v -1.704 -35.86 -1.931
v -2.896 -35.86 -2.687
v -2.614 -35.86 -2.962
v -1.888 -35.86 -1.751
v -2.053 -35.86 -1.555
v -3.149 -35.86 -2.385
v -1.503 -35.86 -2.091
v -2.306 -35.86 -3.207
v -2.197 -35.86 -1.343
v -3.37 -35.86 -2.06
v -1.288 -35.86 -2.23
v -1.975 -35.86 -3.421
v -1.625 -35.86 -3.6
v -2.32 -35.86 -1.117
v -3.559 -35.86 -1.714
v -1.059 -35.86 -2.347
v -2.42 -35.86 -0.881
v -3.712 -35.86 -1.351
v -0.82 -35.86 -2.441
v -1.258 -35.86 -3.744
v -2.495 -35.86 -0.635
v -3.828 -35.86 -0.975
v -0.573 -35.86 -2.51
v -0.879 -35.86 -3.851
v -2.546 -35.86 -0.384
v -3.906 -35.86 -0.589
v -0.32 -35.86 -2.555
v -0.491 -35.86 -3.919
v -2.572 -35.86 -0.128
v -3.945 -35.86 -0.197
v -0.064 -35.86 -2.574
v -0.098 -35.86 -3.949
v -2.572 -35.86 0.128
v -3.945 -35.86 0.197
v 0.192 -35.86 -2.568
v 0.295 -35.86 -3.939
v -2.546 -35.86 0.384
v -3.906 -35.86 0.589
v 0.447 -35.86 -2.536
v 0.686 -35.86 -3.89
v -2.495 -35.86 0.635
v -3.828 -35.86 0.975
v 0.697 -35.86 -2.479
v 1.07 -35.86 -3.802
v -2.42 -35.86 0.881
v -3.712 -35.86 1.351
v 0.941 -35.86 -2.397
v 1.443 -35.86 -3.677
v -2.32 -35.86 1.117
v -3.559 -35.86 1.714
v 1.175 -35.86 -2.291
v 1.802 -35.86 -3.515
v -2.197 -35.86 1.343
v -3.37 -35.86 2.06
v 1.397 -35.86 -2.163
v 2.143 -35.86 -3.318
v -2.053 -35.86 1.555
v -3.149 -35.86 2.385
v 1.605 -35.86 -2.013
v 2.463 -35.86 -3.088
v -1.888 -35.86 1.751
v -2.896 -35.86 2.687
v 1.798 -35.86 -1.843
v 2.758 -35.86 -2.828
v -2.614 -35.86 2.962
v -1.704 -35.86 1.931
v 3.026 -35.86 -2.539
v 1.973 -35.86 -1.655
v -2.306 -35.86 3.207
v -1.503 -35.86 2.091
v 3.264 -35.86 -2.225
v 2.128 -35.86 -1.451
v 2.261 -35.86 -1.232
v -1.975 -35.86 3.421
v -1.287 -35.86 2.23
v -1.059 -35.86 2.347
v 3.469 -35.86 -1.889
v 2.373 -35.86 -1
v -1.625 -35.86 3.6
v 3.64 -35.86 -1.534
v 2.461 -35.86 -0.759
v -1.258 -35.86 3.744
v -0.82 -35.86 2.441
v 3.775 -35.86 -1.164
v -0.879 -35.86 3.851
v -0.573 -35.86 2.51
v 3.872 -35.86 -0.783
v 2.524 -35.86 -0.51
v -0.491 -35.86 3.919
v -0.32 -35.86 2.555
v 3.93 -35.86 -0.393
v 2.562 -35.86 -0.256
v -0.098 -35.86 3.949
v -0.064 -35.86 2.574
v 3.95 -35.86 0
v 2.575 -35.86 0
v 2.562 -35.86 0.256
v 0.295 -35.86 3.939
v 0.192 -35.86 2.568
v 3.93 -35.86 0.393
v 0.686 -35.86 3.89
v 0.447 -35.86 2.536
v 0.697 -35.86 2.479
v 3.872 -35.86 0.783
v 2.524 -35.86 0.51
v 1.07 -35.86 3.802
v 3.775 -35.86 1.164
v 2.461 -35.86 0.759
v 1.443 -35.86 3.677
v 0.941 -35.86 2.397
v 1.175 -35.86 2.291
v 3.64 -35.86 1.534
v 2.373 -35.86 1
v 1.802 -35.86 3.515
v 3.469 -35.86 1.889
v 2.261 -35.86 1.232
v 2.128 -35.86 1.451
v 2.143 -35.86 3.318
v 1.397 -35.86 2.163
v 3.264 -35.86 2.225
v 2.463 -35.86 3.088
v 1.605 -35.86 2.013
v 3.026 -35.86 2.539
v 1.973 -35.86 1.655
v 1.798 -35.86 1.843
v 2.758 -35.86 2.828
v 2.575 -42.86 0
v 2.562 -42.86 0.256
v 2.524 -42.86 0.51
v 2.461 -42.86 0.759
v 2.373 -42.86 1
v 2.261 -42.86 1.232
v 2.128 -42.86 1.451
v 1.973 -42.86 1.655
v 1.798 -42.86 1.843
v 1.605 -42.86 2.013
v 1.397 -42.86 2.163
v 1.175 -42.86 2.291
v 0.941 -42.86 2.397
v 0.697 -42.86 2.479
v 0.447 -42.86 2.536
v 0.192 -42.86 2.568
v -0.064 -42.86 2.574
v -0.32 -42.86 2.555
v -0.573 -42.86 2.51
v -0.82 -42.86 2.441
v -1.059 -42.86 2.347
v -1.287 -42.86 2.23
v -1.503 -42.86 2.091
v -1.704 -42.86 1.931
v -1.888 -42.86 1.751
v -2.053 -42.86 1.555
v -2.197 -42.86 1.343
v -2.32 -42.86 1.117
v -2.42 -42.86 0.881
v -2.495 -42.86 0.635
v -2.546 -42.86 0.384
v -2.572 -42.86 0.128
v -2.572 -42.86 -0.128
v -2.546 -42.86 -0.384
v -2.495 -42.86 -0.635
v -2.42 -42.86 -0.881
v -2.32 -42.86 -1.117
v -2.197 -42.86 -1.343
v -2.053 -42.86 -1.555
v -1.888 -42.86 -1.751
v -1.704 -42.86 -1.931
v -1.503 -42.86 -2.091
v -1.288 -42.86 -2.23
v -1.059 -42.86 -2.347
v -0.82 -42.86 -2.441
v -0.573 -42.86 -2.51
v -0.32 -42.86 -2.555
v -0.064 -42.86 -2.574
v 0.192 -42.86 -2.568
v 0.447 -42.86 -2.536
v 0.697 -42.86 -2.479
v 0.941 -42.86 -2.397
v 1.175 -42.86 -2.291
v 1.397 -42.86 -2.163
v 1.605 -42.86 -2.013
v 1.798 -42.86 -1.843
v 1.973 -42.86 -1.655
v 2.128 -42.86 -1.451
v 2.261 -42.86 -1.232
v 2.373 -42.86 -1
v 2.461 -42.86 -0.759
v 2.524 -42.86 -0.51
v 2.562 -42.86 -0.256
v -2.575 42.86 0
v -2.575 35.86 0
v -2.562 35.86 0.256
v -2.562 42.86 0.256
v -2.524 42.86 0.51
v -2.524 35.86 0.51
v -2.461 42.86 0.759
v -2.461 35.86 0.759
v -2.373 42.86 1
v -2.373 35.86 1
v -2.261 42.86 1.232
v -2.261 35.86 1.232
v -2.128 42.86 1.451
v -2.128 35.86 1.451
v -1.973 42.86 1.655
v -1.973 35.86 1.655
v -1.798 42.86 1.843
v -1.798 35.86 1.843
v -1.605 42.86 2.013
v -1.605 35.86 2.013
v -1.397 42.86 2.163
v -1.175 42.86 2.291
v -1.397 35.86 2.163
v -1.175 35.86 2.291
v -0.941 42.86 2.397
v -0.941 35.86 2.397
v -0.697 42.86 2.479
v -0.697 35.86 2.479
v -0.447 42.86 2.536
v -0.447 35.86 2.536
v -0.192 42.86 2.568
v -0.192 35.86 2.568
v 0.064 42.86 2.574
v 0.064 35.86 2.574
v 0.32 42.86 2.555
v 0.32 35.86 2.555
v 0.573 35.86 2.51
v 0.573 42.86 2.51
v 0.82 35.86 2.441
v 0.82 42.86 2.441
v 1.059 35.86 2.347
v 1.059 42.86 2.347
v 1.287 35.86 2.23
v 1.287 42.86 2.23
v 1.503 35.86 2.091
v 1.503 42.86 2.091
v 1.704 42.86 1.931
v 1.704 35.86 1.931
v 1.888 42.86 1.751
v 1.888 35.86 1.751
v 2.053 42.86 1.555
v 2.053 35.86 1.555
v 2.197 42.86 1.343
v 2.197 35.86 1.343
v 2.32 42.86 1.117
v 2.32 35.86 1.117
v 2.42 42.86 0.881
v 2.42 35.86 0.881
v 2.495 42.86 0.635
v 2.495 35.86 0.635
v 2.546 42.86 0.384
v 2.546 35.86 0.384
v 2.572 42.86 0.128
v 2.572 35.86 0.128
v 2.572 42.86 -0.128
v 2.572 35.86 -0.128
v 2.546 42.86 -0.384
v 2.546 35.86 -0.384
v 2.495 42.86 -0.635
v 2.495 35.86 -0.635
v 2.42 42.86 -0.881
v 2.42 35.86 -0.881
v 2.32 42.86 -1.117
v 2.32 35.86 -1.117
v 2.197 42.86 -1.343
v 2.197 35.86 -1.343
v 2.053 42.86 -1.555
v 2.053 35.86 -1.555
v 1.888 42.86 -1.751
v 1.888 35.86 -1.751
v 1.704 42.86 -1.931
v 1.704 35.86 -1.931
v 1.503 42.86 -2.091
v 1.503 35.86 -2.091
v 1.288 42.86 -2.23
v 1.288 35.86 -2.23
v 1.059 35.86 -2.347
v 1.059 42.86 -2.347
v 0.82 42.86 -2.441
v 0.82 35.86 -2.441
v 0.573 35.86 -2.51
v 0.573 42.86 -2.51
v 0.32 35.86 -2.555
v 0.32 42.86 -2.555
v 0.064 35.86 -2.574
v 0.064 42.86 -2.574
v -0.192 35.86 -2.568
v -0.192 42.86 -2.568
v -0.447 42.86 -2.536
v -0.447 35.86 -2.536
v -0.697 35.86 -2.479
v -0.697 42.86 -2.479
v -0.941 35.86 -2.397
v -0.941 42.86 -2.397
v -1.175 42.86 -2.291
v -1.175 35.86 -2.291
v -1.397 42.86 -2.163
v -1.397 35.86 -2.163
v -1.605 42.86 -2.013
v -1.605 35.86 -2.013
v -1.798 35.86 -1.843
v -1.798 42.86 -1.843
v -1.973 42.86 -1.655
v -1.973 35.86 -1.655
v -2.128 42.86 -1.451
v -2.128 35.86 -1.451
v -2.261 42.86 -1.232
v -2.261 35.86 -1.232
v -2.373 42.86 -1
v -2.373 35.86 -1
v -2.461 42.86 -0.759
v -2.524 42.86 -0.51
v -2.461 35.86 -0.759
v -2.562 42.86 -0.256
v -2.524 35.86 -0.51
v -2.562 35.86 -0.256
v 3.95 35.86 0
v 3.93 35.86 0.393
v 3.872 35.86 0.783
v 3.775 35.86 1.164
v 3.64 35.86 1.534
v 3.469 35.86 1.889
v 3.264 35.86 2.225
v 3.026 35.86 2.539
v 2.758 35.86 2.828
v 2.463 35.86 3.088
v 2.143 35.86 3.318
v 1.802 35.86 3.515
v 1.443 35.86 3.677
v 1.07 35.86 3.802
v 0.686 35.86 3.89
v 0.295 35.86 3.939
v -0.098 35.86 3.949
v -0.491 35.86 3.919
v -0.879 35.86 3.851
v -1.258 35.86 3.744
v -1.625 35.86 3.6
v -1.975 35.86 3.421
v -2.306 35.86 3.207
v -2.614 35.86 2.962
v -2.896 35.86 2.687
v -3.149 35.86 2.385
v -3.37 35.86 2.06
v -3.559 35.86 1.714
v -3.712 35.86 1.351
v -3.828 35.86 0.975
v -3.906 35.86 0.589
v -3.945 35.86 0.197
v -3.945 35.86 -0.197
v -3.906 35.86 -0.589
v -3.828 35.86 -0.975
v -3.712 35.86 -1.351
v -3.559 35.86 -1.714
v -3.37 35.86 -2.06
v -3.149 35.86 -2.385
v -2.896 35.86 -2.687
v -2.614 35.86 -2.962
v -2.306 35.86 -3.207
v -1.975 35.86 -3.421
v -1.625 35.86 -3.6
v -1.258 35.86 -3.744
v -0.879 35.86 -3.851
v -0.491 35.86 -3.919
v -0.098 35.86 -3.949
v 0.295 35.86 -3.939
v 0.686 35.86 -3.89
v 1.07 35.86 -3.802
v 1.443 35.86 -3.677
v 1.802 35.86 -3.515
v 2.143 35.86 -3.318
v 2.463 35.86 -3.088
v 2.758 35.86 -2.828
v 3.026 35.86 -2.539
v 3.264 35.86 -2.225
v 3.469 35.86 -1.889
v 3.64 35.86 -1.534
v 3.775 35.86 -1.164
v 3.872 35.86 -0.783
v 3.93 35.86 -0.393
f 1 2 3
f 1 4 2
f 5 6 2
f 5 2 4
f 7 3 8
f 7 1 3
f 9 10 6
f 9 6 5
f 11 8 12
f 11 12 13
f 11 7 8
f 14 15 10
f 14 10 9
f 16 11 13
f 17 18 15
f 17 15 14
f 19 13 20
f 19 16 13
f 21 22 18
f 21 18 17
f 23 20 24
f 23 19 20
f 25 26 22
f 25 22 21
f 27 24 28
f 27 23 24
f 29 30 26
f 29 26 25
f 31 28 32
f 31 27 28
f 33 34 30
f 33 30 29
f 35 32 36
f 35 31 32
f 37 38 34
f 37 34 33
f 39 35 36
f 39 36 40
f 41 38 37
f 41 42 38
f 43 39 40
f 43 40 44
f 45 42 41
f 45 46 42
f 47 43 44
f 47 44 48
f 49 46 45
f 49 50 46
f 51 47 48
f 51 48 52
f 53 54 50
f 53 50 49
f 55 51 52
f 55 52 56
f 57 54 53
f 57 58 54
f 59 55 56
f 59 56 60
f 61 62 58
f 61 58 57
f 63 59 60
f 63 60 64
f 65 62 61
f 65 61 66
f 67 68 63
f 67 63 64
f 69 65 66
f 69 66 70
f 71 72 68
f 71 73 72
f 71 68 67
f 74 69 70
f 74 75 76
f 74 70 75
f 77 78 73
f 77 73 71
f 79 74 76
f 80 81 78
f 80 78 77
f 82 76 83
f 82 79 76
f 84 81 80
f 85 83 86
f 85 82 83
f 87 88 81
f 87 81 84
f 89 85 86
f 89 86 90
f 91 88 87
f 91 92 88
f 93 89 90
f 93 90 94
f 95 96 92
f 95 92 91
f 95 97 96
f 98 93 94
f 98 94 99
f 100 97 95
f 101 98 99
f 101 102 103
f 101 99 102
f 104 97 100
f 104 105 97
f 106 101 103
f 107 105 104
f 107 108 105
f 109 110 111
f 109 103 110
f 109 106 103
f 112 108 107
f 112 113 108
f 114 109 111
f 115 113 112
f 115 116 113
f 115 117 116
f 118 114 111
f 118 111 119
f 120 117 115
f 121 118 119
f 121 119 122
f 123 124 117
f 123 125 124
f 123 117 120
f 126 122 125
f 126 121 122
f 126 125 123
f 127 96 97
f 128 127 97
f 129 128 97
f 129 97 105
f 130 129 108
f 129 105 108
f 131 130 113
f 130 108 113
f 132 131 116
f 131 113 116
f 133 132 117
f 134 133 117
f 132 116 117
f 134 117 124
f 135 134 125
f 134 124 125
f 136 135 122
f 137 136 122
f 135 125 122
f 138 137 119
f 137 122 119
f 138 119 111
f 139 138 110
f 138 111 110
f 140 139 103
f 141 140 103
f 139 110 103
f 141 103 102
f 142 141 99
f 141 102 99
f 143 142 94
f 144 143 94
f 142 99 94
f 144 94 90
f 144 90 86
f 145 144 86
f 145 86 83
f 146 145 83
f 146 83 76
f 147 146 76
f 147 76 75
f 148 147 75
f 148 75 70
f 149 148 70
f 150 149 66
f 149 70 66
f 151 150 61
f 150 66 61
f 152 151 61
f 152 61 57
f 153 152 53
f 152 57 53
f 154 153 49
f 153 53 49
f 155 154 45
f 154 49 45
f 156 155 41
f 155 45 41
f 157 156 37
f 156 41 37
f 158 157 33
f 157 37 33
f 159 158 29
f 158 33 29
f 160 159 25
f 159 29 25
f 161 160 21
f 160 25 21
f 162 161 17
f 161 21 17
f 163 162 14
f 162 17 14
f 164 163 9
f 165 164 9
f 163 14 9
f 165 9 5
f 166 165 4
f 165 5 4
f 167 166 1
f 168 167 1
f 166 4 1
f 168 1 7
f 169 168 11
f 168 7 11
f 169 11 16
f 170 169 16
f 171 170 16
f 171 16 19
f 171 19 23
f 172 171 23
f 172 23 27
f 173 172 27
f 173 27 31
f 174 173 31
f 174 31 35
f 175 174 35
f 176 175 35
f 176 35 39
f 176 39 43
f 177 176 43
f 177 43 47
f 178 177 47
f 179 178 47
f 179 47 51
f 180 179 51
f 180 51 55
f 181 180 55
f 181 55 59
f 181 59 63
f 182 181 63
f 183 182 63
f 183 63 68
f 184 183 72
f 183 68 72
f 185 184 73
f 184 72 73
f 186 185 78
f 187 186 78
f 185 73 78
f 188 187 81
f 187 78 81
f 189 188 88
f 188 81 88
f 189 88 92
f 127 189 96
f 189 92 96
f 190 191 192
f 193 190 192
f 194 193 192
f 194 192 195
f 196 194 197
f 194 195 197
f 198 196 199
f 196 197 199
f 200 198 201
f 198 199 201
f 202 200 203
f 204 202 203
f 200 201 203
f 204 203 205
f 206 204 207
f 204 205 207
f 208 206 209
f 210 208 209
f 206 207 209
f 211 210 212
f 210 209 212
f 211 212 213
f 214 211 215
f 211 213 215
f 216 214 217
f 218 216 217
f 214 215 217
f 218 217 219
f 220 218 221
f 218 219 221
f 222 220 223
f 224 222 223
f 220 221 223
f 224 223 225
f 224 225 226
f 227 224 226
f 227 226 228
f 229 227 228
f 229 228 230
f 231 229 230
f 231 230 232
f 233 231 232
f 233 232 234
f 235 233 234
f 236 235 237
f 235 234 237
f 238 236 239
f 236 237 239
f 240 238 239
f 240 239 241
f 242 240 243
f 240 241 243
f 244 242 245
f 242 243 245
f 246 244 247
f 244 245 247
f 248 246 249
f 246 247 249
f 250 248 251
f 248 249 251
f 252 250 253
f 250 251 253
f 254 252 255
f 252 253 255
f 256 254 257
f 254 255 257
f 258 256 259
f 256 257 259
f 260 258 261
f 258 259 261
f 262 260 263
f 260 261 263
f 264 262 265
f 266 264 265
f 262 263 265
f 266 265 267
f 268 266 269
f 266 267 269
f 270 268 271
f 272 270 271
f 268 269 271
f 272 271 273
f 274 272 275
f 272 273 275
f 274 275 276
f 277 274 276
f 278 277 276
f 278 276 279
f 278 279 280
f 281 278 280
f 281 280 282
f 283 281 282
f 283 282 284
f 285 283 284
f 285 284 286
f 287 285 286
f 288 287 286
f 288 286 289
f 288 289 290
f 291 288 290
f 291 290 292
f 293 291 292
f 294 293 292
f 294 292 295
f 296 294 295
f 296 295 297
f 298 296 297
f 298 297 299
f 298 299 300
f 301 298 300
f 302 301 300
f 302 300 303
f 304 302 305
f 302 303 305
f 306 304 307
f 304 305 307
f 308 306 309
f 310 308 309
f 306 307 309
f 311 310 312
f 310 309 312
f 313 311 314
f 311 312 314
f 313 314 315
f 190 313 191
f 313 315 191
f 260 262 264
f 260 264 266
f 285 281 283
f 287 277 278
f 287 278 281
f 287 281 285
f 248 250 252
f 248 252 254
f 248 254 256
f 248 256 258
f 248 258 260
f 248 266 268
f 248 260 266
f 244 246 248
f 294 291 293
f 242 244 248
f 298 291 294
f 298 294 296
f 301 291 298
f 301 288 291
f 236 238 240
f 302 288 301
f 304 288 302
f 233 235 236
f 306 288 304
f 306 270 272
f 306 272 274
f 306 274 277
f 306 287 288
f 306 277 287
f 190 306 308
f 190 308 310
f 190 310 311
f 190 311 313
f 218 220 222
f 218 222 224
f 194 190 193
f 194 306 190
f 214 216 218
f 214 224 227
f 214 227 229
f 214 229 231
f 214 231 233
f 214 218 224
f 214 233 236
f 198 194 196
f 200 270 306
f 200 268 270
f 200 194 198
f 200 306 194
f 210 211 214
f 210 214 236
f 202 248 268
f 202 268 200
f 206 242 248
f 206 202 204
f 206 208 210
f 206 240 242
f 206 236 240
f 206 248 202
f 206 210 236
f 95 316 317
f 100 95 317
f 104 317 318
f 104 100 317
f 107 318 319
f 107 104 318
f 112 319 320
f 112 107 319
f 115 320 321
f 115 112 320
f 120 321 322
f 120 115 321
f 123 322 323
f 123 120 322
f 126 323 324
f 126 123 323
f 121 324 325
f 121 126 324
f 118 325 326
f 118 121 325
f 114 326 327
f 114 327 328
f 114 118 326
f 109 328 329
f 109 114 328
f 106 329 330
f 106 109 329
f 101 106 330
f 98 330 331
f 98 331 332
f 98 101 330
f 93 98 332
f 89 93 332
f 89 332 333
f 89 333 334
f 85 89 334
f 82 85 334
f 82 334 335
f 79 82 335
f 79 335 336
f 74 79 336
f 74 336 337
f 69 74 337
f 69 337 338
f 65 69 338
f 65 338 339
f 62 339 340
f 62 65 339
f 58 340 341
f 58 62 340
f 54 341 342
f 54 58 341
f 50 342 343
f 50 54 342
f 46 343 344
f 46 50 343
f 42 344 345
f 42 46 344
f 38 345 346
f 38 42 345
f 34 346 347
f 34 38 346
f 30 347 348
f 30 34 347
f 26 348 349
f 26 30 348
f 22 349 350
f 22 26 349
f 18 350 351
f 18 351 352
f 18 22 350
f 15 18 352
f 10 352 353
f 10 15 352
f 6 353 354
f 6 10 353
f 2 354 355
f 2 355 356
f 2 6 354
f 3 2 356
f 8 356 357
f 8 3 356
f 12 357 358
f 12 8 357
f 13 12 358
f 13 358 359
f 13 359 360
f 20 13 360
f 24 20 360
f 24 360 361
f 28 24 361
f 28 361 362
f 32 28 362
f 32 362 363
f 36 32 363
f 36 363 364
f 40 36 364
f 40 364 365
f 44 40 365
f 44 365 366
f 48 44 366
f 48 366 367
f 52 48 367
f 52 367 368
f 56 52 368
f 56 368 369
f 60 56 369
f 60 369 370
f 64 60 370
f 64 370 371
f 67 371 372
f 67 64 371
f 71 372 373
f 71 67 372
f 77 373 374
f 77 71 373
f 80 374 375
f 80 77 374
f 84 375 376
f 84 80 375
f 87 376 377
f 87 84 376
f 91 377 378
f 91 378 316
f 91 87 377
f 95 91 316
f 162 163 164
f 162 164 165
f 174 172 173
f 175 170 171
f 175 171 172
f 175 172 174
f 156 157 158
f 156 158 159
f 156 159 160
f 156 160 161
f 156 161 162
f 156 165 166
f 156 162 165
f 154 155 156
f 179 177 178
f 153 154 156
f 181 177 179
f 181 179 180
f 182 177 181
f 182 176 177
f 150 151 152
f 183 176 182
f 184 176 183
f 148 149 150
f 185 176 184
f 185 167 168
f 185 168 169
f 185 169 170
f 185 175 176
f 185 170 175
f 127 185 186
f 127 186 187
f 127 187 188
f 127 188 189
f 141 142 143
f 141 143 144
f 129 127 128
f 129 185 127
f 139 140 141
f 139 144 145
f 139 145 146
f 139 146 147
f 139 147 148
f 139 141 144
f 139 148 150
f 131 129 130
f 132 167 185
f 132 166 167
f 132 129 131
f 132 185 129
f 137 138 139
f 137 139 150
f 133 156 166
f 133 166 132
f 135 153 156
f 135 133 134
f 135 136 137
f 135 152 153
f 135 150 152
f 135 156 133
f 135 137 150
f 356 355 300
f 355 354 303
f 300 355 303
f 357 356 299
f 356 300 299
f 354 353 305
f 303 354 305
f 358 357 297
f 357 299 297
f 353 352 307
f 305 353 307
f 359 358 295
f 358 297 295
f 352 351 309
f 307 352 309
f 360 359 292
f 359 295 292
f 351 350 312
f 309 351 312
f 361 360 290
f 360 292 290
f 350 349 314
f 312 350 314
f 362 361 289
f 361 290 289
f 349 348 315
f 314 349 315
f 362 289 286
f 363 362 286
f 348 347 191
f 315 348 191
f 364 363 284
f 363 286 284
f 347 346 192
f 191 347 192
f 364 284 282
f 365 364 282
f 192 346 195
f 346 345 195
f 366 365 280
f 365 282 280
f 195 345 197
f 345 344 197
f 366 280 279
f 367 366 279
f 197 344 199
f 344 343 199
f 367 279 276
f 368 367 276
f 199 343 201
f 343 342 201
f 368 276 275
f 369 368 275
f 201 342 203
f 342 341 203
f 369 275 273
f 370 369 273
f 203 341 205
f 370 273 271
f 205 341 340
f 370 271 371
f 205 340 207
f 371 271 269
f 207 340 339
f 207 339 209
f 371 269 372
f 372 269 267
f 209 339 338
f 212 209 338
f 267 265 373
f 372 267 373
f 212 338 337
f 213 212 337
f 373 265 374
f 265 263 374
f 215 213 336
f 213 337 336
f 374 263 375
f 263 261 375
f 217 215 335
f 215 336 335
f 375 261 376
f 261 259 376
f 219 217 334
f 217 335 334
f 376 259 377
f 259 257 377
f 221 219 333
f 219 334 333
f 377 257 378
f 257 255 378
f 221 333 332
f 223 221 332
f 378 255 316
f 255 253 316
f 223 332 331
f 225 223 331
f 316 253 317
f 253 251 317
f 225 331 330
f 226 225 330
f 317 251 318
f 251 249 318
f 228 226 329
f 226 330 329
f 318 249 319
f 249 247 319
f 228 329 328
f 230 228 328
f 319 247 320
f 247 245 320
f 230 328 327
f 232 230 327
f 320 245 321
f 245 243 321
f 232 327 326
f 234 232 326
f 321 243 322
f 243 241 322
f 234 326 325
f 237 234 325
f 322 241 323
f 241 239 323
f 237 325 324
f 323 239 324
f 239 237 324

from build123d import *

# Parameters (mm, degrees)
F0_R          = 3.95
F1_DEPTH      = 35.86
F1_DEPTH_BACK = 35.86
F2_R          = 2.575
F3_DEPTH      = 7
F4_R          = 2.575
F5_DEPTH      = 7


with BuildPart() as f1:
    # F0 (on Front) → F1 (new body, two sides)
    with BuildSketch(Plane.XZ) as f1_sk:
        Circle(F0_R)
    extrude(amount=F1_DEPTH)
    extrude(f1_sk.sketch, amount=-F1_DEPTH_BACK)

    # F2 (on face) → F3 (join)
    with BuildSketch(Plane(origin=(0, 35.86, 0), x_dir=(-1, 0, 0), z_dir=(0, 1, 0))):
        Circle(F2_R)
    extrude(amount=F3_DEPTH)

    # F4 (on face) → F5 (join)
    with BuildSketch(Plane.XZ.offset(35.86)):
        Circle(F4_R)
    extrude(amount=F5_DEPTH)


solid = f1.part
